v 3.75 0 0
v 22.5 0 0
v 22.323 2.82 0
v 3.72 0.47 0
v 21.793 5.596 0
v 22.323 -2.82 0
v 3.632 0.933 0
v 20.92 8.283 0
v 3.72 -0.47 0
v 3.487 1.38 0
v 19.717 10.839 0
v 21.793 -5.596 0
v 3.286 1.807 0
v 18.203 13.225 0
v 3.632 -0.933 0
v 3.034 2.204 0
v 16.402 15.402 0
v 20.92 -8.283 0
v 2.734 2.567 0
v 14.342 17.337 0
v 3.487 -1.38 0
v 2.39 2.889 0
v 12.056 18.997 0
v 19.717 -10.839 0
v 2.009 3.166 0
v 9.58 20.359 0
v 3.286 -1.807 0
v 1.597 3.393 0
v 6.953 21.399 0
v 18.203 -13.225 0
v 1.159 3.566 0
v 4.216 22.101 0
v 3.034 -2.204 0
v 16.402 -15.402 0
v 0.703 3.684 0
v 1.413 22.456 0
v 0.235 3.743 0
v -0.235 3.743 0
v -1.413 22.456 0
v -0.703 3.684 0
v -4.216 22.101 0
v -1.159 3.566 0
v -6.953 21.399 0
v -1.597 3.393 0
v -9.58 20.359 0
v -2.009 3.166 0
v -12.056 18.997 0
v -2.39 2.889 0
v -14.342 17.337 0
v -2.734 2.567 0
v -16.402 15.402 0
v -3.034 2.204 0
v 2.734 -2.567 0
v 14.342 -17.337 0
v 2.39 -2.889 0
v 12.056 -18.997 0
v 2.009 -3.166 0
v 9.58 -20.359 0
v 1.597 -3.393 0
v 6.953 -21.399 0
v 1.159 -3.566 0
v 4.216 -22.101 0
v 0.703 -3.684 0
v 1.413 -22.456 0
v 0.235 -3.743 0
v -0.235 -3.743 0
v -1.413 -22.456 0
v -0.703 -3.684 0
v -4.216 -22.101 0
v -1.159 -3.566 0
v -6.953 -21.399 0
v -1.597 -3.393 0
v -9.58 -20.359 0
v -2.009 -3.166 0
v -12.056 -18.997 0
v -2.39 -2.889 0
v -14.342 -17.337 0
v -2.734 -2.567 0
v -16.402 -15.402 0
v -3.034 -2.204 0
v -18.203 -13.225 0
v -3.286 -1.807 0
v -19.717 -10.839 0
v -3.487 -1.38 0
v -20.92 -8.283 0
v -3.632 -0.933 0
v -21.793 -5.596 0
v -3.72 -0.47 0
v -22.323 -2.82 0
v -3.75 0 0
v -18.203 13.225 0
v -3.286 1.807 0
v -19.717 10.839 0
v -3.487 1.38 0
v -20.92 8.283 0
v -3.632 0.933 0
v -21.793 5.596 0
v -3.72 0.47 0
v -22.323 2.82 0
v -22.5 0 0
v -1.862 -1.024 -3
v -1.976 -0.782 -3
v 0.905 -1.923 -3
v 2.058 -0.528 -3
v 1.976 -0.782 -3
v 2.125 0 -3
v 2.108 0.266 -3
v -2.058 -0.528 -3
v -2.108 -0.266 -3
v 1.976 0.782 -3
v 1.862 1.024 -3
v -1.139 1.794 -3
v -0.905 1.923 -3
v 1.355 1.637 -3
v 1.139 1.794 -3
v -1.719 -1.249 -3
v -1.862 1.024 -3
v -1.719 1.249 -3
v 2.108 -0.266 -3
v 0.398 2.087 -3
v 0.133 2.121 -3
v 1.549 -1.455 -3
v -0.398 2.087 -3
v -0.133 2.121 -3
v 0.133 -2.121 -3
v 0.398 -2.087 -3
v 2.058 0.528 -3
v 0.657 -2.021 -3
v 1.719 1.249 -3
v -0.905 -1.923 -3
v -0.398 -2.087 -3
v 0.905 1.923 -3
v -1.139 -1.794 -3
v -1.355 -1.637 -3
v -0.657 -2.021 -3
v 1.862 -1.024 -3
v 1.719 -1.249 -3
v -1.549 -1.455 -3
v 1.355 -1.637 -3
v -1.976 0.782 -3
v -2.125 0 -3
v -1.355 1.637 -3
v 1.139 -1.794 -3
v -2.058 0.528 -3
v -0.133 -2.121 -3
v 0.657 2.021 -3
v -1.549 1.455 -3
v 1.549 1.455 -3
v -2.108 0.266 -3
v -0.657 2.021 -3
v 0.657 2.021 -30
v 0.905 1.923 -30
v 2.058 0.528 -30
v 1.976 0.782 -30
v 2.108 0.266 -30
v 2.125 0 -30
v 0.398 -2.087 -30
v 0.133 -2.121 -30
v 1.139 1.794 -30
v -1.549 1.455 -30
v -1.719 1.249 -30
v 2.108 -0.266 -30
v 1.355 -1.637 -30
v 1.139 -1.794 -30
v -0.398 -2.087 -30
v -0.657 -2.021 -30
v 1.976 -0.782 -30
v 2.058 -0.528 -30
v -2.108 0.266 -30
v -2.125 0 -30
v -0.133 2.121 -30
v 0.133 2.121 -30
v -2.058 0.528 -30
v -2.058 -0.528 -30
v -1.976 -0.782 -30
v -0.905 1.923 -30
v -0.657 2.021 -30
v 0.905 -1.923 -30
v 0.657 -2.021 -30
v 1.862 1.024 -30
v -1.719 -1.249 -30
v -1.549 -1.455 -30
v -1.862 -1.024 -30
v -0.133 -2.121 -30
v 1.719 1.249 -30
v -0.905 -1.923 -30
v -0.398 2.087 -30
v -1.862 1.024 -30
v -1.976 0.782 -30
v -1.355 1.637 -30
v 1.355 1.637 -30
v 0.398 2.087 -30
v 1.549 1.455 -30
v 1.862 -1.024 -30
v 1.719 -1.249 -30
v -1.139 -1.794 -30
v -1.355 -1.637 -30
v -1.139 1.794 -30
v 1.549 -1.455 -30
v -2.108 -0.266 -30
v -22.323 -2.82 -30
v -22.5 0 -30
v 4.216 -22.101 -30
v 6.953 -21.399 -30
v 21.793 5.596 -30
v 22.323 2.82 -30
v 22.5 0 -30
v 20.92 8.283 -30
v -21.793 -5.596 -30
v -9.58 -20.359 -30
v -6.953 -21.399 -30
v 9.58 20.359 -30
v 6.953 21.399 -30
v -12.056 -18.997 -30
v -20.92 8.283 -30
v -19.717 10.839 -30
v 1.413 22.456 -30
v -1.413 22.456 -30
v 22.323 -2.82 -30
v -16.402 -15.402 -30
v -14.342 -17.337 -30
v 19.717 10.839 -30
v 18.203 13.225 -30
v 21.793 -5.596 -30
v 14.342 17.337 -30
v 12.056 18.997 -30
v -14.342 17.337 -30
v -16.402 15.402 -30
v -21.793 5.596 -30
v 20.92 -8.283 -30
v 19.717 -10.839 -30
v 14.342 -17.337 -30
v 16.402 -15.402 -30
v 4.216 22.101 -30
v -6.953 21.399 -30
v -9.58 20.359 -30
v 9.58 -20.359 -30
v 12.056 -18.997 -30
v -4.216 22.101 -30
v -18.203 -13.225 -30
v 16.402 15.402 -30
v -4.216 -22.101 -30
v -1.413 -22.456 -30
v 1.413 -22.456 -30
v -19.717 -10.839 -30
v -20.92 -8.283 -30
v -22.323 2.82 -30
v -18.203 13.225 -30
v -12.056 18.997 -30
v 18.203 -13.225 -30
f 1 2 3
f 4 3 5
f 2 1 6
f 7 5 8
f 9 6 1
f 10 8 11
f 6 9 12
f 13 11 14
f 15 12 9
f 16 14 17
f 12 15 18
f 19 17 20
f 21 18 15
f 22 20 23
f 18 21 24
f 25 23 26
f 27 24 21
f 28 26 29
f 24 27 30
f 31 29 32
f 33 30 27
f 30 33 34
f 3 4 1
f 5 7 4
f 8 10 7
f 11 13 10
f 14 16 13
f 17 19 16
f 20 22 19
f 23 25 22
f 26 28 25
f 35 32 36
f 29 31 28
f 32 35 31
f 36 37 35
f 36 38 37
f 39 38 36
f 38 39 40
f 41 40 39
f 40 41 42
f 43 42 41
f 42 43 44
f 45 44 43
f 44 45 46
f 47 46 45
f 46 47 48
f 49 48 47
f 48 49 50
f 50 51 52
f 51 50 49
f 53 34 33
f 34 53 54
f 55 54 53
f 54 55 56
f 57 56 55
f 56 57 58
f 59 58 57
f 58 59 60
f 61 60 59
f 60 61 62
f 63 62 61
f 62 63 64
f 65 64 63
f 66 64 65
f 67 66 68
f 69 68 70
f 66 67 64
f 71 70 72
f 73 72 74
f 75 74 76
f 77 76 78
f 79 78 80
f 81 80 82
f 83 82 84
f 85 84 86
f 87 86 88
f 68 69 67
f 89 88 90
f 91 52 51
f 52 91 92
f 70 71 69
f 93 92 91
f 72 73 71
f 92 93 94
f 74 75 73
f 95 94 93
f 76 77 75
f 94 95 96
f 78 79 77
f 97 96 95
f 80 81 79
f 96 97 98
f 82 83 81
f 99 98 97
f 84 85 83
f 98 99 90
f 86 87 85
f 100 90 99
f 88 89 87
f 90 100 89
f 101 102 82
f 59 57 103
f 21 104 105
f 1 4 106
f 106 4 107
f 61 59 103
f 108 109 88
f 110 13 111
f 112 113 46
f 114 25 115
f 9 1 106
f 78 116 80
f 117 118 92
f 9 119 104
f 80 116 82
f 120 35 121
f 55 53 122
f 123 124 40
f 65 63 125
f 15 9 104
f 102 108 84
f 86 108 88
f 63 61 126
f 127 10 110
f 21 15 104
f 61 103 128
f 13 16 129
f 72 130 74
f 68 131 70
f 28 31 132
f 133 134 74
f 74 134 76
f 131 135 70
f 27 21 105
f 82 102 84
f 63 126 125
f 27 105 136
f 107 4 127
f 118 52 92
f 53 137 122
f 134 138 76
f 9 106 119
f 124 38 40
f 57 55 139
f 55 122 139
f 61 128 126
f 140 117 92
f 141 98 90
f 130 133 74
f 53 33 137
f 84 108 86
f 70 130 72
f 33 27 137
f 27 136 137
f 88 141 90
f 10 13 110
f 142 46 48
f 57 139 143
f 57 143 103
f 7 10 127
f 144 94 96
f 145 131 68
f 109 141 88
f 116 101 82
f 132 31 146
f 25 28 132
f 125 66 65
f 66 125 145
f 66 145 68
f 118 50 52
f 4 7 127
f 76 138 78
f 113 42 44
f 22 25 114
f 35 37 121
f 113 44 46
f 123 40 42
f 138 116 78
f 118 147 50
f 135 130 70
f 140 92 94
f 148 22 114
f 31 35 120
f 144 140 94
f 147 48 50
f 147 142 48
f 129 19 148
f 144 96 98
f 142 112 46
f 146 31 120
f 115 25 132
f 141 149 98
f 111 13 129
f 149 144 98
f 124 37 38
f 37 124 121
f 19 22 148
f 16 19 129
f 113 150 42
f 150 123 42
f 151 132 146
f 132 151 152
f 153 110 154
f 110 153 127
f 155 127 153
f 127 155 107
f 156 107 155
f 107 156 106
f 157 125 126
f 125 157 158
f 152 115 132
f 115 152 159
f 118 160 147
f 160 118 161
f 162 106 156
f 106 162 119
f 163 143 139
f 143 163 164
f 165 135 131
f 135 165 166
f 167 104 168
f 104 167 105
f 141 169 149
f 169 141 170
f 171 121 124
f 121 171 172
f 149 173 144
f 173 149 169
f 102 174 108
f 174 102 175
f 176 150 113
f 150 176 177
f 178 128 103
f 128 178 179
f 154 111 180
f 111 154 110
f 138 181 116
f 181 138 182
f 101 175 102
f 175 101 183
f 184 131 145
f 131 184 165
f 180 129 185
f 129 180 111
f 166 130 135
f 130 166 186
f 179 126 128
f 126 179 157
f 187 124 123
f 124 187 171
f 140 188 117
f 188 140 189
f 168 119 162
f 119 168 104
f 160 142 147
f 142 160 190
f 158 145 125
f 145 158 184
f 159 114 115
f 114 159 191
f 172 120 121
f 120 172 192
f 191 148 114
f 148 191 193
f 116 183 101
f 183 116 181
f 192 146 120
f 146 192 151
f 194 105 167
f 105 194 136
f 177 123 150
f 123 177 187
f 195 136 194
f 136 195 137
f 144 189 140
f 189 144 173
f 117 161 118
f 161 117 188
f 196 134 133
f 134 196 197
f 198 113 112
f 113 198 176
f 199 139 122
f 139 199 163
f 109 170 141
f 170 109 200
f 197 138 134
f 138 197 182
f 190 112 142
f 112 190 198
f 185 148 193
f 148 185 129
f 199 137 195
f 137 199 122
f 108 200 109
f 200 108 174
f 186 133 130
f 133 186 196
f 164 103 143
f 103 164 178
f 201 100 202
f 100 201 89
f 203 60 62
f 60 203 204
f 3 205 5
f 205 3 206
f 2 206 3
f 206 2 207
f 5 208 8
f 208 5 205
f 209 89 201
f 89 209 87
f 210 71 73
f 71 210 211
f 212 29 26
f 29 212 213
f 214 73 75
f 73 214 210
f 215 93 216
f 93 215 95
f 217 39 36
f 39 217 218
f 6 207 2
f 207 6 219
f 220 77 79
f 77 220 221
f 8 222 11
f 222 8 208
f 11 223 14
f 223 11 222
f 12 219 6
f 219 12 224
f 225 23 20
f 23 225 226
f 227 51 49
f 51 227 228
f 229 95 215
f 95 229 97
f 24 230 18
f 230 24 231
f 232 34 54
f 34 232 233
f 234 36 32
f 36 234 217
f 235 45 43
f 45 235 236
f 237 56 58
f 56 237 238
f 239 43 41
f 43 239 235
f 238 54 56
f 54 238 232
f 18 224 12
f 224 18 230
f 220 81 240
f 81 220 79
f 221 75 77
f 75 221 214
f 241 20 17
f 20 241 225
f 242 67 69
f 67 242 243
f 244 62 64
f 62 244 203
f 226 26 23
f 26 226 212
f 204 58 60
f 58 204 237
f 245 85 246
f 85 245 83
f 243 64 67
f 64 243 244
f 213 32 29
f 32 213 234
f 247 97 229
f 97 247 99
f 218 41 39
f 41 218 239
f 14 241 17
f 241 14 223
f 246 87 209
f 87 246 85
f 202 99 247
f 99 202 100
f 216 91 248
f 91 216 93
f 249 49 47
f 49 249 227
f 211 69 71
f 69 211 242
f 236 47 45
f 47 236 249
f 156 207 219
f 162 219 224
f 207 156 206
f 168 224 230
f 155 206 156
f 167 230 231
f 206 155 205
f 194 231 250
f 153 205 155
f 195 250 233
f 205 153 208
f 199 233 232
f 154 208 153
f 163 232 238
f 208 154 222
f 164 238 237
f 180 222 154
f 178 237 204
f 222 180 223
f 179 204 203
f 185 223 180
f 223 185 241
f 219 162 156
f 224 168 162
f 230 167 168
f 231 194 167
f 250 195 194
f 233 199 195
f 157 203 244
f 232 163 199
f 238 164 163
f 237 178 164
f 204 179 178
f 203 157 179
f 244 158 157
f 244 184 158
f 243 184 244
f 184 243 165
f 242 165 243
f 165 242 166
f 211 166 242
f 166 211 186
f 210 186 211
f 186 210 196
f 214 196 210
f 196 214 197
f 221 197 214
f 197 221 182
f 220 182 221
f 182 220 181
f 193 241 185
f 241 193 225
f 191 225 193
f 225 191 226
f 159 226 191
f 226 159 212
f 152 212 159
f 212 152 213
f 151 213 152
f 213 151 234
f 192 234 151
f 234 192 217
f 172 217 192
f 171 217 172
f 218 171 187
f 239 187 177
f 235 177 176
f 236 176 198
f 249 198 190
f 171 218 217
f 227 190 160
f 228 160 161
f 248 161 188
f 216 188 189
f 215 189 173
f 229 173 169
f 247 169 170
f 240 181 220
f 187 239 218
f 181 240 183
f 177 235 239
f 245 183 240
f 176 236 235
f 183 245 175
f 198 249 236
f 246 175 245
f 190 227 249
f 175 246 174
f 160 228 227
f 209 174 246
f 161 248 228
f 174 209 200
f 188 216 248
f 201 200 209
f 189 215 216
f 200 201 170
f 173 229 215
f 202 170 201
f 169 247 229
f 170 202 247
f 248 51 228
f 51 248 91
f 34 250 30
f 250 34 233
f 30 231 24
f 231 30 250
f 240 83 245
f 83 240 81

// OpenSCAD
$fn = 50;


difference() {
	union() {
		translate(v = [0, 0, -30.0000000000]) {
			cylinder(h = 30, r = 22.5000000000);
		}
	}
	union() {
		translate(v = [0, 0, 0]) {
			rotate(a = [0, 0, 0]) {
				difference() {
					union() {
						translate(v = [0, 0, -33.0000000000]) {
							cylinder(h = 33, r = 2.0000000000);
						}
						translate(v = [0, 0, -3]) {
							cylinder(h = 3, r1 = 2.1250000000, r2 = 3.7500000000);
						}
						translate(v = [0, 0, -33.0000000000]) {
							cylinder(h = 33, r = 2.1250000000);
						}
						translate(v = [0, 0, -33.0000000000]) {
							cylinder(h = 33, r = 2.0000000000);
						}
					}
					union();
				}
			}
		}
	}
}
